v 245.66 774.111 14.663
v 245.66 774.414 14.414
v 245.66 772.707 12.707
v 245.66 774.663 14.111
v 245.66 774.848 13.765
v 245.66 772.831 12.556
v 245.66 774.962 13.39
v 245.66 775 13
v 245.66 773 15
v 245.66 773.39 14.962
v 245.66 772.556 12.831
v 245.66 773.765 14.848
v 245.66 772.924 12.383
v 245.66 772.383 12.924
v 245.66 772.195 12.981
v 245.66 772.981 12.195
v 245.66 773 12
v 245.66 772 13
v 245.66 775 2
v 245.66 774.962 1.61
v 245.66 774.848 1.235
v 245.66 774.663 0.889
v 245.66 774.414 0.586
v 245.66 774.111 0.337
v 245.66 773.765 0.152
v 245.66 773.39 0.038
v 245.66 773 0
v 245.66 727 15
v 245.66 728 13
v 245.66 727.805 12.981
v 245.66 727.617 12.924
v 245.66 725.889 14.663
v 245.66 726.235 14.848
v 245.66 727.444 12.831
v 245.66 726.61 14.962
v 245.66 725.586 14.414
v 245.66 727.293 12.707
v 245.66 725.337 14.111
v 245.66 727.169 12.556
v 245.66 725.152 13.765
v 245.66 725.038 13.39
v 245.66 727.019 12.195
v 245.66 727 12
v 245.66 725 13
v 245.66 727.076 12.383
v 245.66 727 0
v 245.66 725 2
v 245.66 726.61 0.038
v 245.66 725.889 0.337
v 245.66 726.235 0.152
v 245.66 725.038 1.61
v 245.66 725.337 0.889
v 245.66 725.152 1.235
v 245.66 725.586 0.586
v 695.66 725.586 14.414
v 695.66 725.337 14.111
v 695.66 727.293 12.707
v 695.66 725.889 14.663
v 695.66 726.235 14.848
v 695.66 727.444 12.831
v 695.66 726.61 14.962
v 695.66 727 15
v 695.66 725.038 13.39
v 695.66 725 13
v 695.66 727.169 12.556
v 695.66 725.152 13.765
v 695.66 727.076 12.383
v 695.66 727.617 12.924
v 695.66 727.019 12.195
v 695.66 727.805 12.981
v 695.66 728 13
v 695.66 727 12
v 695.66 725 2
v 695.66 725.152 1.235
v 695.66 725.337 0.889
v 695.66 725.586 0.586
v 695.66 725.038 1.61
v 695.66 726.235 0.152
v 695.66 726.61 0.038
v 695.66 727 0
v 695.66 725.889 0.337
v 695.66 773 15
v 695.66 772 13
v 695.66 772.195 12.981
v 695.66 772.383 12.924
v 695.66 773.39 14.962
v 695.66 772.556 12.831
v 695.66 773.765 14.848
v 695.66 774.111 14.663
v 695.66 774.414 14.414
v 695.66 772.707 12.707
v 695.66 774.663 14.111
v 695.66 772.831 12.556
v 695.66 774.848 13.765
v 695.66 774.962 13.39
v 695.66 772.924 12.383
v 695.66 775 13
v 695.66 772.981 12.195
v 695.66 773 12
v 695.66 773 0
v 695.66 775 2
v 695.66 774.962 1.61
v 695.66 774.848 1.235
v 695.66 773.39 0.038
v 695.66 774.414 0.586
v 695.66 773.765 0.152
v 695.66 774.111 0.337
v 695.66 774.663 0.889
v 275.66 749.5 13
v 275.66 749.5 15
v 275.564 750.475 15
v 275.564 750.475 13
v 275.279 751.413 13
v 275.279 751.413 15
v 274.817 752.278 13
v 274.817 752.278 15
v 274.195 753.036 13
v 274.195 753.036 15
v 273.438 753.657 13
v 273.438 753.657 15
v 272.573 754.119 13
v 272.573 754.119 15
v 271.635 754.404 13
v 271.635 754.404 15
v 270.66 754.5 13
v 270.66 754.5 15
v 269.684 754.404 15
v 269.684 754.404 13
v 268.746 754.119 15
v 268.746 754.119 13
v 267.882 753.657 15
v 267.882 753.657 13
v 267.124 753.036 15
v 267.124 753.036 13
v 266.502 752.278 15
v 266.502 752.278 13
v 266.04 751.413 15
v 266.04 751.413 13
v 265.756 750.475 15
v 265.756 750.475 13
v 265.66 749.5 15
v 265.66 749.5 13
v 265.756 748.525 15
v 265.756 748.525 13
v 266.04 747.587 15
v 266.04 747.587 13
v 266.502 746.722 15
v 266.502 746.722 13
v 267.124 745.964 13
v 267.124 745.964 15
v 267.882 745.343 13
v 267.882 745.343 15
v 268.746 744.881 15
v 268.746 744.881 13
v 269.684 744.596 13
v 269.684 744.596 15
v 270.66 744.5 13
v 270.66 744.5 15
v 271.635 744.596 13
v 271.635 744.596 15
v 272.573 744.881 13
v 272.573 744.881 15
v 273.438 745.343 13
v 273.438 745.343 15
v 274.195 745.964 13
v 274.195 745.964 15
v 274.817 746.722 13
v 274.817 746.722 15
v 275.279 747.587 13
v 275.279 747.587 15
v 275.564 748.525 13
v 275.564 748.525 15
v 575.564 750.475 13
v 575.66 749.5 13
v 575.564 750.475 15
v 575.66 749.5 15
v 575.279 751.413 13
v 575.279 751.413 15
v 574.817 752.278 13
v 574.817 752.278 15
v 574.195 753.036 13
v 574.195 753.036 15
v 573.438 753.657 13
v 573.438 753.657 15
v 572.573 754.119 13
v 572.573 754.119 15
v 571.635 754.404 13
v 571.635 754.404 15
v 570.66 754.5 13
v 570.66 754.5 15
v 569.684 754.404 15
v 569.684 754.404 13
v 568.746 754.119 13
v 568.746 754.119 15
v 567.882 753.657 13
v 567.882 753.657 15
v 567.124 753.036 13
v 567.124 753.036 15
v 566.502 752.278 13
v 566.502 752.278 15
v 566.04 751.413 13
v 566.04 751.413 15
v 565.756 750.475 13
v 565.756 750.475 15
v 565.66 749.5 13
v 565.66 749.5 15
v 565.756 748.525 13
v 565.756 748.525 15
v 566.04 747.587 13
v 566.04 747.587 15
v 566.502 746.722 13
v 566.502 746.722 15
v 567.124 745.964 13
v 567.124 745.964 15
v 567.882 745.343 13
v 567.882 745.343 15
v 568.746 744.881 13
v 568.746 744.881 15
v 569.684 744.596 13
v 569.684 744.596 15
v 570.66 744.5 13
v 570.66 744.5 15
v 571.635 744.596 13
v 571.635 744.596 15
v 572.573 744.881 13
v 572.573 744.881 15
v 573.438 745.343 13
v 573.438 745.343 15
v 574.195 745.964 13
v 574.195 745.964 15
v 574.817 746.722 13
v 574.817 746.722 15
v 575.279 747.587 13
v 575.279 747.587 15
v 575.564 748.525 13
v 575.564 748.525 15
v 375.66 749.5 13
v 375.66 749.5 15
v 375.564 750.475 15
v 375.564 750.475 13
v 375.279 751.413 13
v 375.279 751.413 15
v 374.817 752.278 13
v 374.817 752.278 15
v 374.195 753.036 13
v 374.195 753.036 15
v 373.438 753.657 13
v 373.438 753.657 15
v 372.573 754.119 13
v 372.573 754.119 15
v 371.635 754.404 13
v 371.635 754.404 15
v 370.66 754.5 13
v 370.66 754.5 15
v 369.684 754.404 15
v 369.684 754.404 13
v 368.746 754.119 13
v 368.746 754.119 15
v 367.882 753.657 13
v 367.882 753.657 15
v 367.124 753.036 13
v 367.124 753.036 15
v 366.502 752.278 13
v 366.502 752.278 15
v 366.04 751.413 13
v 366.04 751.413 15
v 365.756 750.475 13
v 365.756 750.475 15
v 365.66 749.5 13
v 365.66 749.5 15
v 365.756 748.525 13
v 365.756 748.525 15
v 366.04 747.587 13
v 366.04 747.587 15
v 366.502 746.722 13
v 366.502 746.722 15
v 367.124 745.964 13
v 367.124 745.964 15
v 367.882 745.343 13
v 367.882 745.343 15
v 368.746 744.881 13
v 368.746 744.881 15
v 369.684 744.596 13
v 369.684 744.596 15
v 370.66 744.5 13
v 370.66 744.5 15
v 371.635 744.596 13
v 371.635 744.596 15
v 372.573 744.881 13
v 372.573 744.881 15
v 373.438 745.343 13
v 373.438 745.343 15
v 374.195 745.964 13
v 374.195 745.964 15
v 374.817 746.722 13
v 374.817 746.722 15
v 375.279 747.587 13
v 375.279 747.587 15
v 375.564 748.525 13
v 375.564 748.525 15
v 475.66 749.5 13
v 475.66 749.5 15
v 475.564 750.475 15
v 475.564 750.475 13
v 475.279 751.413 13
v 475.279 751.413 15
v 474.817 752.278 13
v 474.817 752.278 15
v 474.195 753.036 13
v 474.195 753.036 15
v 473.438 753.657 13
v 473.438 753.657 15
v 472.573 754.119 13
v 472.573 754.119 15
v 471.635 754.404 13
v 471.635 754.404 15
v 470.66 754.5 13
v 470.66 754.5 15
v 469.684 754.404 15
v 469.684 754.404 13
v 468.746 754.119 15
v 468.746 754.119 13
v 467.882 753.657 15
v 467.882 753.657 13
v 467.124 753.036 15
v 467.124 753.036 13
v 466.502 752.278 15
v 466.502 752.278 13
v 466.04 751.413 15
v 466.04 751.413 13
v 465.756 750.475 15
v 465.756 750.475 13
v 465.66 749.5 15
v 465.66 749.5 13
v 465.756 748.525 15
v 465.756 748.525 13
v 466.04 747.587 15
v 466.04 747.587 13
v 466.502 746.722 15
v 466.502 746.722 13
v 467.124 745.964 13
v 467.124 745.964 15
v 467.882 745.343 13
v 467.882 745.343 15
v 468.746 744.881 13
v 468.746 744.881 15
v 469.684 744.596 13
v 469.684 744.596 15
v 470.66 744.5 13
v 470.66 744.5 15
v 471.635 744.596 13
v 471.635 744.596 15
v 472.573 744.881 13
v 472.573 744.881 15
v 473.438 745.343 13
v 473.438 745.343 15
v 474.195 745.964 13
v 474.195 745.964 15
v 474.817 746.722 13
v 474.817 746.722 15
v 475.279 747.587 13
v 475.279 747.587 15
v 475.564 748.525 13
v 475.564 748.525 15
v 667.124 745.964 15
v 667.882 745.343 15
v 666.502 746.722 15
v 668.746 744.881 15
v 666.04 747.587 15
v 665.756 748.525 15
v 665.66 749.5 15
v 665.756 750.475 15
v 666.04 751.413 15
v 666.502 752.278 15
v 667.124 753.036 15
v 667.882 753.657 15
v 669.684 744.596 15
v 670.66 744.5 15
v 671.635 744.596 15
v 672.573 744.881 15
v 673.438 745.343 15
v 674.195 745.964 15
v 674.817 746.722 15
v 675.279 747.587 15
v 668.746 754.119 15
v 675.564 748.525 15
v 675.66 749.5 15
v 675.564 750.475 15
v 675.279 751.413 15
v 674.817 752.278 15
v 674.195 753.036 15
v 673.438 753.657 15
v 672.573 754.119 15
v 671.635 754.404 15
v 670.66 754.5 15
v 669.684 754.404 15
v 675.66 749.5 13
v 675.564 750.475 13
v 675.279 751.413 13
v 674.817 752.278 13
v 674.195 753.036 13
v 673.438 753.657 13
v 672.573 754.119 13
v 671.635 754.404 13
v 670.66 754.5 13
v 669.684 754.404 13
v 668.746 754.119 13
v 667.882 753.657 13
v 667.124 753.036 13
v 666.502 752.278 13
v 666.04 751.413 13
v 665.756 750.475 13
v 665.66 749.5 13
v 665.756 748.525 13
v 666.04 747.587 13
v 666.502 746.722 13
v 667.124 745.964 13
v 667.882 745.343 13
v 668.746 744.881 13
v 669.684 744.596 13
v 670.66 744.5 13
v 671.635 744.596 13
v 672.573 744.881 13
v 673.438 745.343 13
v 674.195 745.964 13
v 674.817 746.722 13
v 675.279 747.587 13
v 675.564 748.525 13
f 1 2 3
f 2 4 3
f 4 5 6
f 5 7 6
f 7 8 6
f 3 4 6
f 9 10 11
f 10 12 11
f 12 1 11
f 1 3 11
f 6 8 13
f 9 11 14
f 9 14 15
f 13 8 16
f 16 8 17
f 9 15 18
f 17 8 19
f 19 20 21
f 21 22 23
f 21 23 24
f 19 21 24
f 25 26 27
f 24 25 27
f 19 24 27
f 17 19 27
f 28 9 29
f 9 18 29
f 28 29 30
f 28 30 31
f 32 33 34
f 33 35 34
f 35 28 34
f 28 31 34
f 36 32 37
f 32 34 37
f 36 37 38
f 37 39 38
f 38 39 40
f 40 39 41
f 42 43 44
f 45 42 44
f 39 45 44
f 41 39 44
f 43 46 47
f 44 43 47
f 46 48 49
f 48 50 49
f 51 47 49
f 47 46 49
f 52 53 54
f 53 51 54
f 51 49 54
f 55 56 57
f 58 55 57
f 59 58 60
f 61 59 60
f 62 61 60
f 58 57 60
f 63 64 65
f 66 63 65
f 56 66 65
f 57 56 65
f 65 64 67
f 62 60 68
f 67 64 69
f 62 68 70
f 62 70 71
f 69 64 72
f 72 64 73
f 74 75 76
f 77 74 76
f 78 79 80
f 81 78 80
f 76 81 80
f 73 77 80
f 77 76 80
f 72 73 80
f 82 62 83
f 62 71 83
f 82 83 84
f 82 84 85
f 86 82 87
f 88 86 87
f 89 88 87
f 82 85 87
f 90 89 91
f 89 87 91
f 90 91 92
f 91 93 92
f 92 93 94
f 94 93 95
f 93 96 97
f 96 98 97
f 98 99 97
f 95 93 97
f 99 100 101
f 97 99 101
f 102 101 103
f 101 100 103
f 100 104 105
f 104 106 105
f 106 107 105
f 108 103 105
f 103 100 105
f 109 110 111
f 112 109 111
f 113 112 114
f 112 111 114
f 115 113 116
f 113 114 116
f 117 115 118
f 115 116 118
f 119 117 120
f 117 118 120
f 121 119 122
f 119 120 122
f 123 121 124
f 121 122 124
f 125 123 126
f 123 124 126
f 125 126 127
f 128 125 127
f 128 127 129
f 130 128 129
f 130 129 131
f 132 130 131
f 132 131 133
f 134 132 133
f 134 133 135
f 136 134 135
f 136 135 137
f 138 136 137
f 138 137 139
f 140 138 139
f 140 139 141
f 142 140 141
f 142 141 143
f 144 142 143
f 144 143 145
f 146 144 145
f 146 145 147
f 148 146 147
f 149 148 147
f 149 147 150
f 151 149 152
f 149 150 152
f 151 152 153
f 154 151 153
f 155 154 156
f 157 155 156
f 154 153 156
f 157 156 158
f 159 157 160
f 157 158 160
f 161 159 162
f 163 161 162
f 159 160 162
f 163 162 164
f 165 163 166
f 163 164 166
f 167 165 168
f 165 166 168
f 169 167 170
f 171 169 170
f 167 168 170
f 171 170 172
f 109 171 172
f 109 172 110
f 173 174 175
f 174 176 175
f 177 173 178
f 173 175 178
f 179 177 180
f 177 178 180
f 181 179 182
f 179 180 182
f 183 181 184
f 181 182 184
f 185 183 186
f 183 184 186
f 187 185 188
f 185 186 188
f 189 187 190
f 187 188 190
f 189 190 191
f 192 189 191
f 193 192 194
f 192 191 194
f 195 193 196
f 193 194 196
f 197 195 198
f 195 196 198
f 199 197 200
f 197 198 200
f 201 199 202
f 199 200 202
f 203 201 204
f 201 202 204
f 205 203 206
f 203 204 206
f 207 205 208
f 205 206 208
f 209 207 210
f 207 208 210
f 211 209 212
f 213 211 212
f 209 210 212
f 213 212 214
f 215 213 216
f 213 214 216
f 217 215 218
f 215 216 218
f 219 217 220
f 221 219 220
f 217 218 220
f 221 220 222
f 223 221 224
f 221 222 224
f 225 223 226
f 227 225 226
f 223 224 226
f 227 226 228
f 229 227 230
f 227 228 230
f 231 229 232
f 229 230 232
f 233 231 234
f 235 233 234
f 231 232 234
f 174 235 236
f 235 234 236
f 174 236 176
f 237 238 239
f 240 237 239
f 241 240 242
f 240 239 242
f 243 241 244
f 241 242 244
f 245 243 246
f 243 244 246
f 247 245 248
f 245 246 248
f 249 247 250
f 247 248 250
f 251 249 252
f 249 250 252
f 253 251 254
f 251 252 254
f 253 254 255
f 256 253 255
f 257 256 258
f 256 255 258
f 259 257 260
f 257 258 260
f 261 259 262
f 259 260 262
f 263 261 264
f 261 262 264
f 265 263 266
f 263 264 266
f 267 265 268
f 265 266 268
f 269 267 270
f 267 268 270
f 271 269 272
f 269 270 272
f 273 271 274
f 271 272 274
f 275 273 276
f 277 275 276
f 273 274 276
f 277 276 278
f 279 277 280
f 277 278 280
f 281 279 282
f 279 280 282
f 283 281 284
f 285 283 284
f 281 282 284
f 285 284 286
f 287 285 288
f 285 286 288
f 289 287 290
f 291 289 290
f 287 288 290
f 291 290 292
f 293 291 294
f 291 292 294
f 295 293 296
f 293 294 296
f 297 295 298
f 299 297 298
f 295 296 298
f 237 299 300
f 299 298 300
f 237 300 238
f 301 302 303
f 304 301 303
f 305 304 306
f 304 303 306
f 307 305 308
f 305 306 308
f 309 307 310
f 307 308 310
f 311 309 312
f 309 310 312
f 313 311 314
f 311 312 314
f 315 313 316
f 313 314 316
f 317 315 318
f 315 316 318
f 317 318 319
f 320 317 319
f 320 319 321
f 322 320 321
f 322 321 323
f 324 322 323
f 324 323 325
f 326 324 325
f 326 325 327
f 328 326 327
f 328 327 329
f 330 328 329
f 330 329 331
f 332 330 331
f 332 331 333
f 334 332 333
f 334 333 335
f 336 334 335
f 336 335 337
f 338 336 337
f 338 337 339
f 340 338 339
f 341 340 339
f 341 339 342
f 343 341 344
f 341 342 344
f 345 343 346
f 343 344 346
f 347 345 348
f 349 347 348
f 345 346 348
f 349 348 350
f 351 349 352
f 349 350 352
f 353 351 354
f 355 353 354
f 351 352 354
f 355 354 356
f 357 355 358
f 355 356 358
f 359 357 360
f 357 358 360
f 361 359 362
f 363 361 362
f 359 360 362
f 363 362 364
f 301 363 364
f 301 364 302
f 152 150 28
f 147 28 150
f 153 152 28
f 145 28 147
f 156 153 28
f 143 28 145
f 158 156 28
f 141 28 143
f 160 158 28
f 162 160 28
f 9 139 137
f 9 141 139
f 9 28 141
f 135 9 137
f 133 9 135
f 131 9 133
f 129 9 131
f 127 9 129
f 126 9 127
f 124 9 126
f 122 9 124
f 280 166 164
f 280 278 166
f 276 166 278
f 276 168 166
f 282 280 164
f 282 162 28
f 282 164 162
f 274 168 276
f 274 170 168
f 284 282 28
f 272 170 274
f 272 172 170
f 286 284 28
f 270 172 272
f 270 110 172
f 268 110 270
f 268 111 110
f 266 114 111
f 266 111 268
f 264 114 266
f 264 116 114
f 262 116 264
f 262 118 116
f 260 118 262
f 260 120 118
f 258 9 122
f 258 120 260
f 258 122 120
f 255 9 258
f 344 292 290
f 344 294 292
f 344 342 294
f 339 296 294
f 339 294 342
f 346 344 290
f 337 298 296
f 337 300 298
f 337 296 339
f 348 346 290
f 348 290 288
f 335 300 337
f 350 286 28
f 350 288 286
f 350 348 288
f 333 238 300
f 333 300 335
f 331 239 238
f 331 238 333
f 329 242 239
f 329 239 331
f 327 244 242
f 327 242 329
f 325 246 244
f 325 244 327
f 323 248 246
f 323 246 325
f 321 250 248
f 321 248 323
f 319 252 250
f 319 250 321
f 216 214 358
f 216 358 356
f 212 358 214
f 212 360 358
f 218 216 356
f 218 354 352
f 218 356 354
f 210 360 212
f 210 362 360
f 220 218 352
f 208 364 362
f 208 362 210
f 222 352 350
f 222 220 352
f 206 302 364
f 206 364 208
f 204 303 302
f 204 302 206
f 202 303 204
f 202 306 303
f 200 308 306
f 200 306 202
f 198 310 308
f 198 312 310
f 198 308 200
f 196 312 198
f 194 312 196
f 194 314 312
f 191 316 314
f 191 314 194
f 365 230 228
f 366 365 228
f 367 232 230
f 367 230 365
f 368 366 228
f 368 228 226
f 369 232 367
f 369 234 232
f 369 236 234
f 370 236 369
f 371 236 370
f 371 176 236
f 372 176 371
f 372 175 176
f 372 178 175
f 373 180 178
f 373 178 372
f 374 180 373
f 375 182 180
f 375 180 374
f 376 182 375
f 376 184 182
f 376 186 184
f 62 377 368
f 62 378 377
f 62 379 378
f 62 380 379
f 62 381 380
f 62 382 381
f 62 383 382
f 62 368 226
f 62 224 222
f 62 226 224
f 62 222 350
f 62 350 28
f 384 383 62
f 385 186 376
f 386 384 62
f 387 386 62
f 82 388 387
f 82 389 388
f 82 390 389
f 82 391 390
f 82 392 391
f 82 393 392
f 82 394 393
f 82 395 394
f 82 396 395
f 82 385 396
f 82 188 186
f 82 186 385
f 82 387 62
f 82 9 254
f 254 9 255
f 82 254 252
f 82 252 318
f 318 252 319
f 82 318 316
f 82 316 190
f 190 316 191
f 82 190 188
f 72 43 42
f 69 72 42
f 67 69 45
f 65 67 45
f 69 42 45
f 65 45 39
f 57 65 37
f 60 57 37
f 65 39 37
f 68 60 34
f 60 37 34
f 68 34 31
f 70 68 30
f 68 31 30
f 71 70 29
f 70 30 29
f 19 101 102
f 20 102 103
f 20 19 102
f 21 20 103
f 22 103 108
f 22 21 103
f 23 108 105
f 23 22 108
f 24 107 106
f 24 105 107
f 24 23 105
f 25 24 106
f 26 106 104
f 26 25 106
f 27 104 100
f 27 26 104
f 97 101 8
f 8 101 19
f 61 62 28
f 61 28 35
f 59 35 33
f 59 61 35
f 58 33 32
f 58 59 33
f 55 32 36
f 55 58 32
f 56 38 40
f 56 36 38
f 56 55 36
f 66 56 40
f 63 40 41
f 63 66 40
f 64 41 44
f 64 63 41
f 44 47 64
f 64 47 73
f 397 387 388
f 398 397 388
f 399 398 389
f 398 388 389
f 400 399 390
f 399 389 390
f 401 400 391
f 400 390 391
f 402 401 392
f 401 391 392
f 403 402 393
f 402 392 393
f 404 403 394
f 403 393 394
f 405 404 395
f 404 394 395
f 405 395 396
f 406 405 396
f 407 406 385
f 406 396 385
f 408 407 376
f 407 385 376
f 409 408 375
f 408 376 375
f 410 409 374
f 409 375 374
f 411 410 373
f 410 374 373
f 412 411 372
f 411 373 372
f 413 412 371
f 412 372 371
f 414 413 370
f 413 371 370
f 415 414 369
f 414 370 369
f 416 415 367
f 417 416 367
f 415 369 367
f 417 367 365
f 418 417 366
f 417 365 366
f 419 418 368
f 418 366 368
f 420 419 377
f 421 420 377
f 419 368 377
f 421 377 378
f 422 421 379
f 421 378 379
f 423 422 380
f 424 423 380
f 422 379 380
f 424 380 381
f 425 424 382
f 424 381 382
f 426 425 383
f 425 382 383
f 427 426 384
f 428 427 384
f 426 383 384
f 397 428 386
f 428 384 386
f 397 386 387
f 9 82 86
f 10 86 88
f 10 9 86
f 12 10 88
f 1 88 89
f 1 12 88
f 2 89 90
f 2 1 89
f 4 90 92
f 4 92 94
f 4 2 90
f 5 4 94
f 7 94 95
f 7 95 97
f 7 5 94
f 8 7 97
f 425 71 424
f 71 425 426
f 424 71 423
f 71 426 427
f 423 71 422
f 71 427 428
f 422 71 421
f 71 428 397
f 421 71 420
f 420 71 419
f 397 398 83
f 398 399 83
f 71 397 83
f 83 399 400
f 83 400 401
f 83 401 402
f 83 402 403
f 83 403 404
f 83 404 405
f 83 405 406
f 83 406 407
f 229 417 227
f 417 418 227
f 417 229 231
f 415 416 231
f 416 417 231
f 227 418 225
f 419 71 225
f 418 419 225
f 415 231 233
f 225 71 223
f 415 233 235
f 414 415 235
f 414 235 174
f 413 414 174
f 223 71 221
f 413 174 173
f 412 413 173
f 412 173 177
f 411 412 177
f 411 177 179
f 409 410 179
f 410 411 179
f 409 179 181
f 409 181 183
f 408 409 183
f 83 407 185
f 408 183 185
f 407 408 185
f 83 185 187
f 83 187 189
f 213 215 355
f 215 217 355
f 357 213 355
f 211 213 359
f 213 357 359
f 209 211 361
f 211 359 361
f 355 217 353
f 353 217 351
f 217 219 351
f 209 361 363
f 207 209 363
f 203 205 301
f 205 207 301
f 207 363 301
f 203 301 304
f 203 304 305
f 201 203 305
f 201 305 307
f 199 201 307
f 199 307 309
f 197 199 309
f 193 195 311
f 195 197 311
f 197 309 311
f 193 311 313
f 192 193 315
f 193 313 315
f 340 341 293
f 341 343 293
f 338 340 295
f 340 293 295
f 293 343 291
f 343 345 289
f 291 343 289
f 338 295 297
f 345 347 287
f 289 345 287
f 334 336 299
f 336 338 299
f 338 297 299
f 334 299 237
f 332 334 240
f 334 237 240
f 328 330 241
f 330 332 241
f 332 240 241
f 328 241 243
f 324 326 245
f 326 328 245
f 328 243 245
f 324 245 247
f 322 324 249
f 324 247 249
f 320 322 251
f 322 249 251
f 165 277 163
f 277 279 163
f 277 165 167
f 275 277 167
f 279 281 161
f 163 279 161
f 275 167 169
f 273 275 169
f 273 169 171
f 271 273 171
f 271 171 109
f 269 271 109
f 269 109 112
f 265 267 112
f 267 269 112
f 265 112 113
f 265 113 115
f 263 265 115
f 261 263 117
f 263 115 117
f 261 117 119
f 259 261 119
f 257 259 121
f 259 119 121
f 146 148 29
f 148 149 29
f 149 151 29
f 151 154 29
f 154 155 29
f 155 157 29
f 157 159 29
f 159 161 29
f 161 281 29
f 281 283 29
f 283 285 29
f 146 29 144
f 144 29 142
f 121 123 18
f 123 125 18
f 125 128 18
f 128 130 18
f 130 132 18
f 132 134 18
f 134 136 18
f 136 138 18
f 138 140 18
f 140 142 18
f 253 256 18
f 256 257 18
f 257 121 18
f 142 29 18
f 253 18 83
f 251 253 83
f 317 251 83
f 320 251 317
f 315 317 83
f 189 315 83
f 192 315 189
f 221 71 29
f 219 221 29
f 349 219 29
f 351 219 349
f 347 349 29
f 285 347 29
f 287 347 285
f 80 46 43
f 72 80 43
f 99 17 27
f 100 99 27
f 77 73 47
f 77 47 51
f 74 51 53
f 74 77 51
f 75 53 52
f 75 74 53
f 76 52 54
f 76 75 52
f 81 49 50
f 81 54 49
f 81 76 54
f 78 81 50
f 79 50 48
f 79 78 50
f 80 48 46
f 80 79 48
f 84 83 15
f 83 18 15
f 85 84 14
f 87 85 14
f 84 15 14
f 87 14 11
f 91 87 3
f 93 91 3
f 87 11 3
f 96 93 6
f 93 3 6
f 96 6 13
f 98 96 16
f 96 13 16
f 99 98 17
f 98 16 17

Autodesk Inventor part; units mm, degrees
ref_plane "YZ Plane" through (0, 0, 0) normal (1, 0, 0) x (0, 1, 0)
ref_plane "XZ Plane" through (0, 0, 0) normal (0, 1, 0) x (-1, 0, 0)
ref_plane "Work Plane1" through (0, 0, 0) normal (0, 0, 1) x (1, 0, 0)
sketch "Sketch1" plane through (0, 0, 0) normal (0, 0, 1) x (1, 0, 0)
  line L0 (245.6597, 725) -> (695.6597, 725)
  line L1 (695.6597, 725) -> (695.6597, 775)
  line L2 (695.6597, 775) -> (245.6597, 775)
  line L3 (245.6597, 775) -> (245.6597, 725)
  line L4 (164.0316, 10) -> (164.0316, 1490) projected
  line L5 (777.2877, 10) -> (164.0316, 10) projected
  line L6 (470.6597, 10) -> (470.6597, 1506) construction
  line L7 (164.0316, 750) -> (680, 750) construction
  point P0 (0, 0)
  point P1 (470.6597, 725)
  point P2 (245.6597, 750)
  dimension "d0" = 450
  dimension "d1" = 50
extrude "Extrusion1" add sketch "Sketch1" along normal blind 15
sketch "Sketch2" plane through (245.6597, 725, 0) normal (-1, 0, 0) x (0, 0, 1)
  line L0 (15, 0) -> (0, 0) projected
  line L1 (0, 0) -> (0, 50) projected
  line L2 (0, 50) -> (15, 50) projected
  line L3 (15, 50) -> (15, 0) projected
  line L4 (12, 48) -> (0, 48)
  line L5 (0, 2) -> (12, 2)
  line L6 (13, 3) -> (13, 47)
  arc A0 (13, 47) -> (12, 48) centre (12, 47) ccw
  arc A1 (12, 2) -> (13, 3) centre (12, 3) ccw
  point P0 (0, -725)
  dimension "d5" = 2
extrude "Extrusion2" cut sketch "Sketch2" against normal through all contours L1 L4 A0 L6 A1 L5
fillet "Fillet1" radius 2 4 edges at (470.6597, 775, 15) (470.6597, 775, 0) (470.6597, 725, 0) (470.6597, 725, 15)
sketch "Sketch3" plane through (0, 0, 15) normal (0, 0, 1) x (1, 0, 0)
  line L0 (245.6597, 727) -> (695.6597, 727) construction
  line L1 (695.6597, 773) -> (695.6597, 727) construction
  line L2 (695.6597, 773) -> (245.6597, 773) construction
  line L3 (245.6597, 727) -> (245.6597, 773) construction
  line L4 (245.6597, 772) -> (695.6597, 772) projected
  line L5 (470.6597, 772) -> (470.6597, 727) construction
  circle A0 centre (470.6597, 749.5) radius 5
  point P0 (0, 0)
  dimension "d10" = 10
extrude "Extrusion3" cut sketch "Sketch3" against normal up to next
pattern_linear "Rectangular Pattern1" count 5 spacing 100 along (1, 0, 0) of "Extrusion3" first direction both ways yes
properties part number "support1" material "Stainless Steel"
